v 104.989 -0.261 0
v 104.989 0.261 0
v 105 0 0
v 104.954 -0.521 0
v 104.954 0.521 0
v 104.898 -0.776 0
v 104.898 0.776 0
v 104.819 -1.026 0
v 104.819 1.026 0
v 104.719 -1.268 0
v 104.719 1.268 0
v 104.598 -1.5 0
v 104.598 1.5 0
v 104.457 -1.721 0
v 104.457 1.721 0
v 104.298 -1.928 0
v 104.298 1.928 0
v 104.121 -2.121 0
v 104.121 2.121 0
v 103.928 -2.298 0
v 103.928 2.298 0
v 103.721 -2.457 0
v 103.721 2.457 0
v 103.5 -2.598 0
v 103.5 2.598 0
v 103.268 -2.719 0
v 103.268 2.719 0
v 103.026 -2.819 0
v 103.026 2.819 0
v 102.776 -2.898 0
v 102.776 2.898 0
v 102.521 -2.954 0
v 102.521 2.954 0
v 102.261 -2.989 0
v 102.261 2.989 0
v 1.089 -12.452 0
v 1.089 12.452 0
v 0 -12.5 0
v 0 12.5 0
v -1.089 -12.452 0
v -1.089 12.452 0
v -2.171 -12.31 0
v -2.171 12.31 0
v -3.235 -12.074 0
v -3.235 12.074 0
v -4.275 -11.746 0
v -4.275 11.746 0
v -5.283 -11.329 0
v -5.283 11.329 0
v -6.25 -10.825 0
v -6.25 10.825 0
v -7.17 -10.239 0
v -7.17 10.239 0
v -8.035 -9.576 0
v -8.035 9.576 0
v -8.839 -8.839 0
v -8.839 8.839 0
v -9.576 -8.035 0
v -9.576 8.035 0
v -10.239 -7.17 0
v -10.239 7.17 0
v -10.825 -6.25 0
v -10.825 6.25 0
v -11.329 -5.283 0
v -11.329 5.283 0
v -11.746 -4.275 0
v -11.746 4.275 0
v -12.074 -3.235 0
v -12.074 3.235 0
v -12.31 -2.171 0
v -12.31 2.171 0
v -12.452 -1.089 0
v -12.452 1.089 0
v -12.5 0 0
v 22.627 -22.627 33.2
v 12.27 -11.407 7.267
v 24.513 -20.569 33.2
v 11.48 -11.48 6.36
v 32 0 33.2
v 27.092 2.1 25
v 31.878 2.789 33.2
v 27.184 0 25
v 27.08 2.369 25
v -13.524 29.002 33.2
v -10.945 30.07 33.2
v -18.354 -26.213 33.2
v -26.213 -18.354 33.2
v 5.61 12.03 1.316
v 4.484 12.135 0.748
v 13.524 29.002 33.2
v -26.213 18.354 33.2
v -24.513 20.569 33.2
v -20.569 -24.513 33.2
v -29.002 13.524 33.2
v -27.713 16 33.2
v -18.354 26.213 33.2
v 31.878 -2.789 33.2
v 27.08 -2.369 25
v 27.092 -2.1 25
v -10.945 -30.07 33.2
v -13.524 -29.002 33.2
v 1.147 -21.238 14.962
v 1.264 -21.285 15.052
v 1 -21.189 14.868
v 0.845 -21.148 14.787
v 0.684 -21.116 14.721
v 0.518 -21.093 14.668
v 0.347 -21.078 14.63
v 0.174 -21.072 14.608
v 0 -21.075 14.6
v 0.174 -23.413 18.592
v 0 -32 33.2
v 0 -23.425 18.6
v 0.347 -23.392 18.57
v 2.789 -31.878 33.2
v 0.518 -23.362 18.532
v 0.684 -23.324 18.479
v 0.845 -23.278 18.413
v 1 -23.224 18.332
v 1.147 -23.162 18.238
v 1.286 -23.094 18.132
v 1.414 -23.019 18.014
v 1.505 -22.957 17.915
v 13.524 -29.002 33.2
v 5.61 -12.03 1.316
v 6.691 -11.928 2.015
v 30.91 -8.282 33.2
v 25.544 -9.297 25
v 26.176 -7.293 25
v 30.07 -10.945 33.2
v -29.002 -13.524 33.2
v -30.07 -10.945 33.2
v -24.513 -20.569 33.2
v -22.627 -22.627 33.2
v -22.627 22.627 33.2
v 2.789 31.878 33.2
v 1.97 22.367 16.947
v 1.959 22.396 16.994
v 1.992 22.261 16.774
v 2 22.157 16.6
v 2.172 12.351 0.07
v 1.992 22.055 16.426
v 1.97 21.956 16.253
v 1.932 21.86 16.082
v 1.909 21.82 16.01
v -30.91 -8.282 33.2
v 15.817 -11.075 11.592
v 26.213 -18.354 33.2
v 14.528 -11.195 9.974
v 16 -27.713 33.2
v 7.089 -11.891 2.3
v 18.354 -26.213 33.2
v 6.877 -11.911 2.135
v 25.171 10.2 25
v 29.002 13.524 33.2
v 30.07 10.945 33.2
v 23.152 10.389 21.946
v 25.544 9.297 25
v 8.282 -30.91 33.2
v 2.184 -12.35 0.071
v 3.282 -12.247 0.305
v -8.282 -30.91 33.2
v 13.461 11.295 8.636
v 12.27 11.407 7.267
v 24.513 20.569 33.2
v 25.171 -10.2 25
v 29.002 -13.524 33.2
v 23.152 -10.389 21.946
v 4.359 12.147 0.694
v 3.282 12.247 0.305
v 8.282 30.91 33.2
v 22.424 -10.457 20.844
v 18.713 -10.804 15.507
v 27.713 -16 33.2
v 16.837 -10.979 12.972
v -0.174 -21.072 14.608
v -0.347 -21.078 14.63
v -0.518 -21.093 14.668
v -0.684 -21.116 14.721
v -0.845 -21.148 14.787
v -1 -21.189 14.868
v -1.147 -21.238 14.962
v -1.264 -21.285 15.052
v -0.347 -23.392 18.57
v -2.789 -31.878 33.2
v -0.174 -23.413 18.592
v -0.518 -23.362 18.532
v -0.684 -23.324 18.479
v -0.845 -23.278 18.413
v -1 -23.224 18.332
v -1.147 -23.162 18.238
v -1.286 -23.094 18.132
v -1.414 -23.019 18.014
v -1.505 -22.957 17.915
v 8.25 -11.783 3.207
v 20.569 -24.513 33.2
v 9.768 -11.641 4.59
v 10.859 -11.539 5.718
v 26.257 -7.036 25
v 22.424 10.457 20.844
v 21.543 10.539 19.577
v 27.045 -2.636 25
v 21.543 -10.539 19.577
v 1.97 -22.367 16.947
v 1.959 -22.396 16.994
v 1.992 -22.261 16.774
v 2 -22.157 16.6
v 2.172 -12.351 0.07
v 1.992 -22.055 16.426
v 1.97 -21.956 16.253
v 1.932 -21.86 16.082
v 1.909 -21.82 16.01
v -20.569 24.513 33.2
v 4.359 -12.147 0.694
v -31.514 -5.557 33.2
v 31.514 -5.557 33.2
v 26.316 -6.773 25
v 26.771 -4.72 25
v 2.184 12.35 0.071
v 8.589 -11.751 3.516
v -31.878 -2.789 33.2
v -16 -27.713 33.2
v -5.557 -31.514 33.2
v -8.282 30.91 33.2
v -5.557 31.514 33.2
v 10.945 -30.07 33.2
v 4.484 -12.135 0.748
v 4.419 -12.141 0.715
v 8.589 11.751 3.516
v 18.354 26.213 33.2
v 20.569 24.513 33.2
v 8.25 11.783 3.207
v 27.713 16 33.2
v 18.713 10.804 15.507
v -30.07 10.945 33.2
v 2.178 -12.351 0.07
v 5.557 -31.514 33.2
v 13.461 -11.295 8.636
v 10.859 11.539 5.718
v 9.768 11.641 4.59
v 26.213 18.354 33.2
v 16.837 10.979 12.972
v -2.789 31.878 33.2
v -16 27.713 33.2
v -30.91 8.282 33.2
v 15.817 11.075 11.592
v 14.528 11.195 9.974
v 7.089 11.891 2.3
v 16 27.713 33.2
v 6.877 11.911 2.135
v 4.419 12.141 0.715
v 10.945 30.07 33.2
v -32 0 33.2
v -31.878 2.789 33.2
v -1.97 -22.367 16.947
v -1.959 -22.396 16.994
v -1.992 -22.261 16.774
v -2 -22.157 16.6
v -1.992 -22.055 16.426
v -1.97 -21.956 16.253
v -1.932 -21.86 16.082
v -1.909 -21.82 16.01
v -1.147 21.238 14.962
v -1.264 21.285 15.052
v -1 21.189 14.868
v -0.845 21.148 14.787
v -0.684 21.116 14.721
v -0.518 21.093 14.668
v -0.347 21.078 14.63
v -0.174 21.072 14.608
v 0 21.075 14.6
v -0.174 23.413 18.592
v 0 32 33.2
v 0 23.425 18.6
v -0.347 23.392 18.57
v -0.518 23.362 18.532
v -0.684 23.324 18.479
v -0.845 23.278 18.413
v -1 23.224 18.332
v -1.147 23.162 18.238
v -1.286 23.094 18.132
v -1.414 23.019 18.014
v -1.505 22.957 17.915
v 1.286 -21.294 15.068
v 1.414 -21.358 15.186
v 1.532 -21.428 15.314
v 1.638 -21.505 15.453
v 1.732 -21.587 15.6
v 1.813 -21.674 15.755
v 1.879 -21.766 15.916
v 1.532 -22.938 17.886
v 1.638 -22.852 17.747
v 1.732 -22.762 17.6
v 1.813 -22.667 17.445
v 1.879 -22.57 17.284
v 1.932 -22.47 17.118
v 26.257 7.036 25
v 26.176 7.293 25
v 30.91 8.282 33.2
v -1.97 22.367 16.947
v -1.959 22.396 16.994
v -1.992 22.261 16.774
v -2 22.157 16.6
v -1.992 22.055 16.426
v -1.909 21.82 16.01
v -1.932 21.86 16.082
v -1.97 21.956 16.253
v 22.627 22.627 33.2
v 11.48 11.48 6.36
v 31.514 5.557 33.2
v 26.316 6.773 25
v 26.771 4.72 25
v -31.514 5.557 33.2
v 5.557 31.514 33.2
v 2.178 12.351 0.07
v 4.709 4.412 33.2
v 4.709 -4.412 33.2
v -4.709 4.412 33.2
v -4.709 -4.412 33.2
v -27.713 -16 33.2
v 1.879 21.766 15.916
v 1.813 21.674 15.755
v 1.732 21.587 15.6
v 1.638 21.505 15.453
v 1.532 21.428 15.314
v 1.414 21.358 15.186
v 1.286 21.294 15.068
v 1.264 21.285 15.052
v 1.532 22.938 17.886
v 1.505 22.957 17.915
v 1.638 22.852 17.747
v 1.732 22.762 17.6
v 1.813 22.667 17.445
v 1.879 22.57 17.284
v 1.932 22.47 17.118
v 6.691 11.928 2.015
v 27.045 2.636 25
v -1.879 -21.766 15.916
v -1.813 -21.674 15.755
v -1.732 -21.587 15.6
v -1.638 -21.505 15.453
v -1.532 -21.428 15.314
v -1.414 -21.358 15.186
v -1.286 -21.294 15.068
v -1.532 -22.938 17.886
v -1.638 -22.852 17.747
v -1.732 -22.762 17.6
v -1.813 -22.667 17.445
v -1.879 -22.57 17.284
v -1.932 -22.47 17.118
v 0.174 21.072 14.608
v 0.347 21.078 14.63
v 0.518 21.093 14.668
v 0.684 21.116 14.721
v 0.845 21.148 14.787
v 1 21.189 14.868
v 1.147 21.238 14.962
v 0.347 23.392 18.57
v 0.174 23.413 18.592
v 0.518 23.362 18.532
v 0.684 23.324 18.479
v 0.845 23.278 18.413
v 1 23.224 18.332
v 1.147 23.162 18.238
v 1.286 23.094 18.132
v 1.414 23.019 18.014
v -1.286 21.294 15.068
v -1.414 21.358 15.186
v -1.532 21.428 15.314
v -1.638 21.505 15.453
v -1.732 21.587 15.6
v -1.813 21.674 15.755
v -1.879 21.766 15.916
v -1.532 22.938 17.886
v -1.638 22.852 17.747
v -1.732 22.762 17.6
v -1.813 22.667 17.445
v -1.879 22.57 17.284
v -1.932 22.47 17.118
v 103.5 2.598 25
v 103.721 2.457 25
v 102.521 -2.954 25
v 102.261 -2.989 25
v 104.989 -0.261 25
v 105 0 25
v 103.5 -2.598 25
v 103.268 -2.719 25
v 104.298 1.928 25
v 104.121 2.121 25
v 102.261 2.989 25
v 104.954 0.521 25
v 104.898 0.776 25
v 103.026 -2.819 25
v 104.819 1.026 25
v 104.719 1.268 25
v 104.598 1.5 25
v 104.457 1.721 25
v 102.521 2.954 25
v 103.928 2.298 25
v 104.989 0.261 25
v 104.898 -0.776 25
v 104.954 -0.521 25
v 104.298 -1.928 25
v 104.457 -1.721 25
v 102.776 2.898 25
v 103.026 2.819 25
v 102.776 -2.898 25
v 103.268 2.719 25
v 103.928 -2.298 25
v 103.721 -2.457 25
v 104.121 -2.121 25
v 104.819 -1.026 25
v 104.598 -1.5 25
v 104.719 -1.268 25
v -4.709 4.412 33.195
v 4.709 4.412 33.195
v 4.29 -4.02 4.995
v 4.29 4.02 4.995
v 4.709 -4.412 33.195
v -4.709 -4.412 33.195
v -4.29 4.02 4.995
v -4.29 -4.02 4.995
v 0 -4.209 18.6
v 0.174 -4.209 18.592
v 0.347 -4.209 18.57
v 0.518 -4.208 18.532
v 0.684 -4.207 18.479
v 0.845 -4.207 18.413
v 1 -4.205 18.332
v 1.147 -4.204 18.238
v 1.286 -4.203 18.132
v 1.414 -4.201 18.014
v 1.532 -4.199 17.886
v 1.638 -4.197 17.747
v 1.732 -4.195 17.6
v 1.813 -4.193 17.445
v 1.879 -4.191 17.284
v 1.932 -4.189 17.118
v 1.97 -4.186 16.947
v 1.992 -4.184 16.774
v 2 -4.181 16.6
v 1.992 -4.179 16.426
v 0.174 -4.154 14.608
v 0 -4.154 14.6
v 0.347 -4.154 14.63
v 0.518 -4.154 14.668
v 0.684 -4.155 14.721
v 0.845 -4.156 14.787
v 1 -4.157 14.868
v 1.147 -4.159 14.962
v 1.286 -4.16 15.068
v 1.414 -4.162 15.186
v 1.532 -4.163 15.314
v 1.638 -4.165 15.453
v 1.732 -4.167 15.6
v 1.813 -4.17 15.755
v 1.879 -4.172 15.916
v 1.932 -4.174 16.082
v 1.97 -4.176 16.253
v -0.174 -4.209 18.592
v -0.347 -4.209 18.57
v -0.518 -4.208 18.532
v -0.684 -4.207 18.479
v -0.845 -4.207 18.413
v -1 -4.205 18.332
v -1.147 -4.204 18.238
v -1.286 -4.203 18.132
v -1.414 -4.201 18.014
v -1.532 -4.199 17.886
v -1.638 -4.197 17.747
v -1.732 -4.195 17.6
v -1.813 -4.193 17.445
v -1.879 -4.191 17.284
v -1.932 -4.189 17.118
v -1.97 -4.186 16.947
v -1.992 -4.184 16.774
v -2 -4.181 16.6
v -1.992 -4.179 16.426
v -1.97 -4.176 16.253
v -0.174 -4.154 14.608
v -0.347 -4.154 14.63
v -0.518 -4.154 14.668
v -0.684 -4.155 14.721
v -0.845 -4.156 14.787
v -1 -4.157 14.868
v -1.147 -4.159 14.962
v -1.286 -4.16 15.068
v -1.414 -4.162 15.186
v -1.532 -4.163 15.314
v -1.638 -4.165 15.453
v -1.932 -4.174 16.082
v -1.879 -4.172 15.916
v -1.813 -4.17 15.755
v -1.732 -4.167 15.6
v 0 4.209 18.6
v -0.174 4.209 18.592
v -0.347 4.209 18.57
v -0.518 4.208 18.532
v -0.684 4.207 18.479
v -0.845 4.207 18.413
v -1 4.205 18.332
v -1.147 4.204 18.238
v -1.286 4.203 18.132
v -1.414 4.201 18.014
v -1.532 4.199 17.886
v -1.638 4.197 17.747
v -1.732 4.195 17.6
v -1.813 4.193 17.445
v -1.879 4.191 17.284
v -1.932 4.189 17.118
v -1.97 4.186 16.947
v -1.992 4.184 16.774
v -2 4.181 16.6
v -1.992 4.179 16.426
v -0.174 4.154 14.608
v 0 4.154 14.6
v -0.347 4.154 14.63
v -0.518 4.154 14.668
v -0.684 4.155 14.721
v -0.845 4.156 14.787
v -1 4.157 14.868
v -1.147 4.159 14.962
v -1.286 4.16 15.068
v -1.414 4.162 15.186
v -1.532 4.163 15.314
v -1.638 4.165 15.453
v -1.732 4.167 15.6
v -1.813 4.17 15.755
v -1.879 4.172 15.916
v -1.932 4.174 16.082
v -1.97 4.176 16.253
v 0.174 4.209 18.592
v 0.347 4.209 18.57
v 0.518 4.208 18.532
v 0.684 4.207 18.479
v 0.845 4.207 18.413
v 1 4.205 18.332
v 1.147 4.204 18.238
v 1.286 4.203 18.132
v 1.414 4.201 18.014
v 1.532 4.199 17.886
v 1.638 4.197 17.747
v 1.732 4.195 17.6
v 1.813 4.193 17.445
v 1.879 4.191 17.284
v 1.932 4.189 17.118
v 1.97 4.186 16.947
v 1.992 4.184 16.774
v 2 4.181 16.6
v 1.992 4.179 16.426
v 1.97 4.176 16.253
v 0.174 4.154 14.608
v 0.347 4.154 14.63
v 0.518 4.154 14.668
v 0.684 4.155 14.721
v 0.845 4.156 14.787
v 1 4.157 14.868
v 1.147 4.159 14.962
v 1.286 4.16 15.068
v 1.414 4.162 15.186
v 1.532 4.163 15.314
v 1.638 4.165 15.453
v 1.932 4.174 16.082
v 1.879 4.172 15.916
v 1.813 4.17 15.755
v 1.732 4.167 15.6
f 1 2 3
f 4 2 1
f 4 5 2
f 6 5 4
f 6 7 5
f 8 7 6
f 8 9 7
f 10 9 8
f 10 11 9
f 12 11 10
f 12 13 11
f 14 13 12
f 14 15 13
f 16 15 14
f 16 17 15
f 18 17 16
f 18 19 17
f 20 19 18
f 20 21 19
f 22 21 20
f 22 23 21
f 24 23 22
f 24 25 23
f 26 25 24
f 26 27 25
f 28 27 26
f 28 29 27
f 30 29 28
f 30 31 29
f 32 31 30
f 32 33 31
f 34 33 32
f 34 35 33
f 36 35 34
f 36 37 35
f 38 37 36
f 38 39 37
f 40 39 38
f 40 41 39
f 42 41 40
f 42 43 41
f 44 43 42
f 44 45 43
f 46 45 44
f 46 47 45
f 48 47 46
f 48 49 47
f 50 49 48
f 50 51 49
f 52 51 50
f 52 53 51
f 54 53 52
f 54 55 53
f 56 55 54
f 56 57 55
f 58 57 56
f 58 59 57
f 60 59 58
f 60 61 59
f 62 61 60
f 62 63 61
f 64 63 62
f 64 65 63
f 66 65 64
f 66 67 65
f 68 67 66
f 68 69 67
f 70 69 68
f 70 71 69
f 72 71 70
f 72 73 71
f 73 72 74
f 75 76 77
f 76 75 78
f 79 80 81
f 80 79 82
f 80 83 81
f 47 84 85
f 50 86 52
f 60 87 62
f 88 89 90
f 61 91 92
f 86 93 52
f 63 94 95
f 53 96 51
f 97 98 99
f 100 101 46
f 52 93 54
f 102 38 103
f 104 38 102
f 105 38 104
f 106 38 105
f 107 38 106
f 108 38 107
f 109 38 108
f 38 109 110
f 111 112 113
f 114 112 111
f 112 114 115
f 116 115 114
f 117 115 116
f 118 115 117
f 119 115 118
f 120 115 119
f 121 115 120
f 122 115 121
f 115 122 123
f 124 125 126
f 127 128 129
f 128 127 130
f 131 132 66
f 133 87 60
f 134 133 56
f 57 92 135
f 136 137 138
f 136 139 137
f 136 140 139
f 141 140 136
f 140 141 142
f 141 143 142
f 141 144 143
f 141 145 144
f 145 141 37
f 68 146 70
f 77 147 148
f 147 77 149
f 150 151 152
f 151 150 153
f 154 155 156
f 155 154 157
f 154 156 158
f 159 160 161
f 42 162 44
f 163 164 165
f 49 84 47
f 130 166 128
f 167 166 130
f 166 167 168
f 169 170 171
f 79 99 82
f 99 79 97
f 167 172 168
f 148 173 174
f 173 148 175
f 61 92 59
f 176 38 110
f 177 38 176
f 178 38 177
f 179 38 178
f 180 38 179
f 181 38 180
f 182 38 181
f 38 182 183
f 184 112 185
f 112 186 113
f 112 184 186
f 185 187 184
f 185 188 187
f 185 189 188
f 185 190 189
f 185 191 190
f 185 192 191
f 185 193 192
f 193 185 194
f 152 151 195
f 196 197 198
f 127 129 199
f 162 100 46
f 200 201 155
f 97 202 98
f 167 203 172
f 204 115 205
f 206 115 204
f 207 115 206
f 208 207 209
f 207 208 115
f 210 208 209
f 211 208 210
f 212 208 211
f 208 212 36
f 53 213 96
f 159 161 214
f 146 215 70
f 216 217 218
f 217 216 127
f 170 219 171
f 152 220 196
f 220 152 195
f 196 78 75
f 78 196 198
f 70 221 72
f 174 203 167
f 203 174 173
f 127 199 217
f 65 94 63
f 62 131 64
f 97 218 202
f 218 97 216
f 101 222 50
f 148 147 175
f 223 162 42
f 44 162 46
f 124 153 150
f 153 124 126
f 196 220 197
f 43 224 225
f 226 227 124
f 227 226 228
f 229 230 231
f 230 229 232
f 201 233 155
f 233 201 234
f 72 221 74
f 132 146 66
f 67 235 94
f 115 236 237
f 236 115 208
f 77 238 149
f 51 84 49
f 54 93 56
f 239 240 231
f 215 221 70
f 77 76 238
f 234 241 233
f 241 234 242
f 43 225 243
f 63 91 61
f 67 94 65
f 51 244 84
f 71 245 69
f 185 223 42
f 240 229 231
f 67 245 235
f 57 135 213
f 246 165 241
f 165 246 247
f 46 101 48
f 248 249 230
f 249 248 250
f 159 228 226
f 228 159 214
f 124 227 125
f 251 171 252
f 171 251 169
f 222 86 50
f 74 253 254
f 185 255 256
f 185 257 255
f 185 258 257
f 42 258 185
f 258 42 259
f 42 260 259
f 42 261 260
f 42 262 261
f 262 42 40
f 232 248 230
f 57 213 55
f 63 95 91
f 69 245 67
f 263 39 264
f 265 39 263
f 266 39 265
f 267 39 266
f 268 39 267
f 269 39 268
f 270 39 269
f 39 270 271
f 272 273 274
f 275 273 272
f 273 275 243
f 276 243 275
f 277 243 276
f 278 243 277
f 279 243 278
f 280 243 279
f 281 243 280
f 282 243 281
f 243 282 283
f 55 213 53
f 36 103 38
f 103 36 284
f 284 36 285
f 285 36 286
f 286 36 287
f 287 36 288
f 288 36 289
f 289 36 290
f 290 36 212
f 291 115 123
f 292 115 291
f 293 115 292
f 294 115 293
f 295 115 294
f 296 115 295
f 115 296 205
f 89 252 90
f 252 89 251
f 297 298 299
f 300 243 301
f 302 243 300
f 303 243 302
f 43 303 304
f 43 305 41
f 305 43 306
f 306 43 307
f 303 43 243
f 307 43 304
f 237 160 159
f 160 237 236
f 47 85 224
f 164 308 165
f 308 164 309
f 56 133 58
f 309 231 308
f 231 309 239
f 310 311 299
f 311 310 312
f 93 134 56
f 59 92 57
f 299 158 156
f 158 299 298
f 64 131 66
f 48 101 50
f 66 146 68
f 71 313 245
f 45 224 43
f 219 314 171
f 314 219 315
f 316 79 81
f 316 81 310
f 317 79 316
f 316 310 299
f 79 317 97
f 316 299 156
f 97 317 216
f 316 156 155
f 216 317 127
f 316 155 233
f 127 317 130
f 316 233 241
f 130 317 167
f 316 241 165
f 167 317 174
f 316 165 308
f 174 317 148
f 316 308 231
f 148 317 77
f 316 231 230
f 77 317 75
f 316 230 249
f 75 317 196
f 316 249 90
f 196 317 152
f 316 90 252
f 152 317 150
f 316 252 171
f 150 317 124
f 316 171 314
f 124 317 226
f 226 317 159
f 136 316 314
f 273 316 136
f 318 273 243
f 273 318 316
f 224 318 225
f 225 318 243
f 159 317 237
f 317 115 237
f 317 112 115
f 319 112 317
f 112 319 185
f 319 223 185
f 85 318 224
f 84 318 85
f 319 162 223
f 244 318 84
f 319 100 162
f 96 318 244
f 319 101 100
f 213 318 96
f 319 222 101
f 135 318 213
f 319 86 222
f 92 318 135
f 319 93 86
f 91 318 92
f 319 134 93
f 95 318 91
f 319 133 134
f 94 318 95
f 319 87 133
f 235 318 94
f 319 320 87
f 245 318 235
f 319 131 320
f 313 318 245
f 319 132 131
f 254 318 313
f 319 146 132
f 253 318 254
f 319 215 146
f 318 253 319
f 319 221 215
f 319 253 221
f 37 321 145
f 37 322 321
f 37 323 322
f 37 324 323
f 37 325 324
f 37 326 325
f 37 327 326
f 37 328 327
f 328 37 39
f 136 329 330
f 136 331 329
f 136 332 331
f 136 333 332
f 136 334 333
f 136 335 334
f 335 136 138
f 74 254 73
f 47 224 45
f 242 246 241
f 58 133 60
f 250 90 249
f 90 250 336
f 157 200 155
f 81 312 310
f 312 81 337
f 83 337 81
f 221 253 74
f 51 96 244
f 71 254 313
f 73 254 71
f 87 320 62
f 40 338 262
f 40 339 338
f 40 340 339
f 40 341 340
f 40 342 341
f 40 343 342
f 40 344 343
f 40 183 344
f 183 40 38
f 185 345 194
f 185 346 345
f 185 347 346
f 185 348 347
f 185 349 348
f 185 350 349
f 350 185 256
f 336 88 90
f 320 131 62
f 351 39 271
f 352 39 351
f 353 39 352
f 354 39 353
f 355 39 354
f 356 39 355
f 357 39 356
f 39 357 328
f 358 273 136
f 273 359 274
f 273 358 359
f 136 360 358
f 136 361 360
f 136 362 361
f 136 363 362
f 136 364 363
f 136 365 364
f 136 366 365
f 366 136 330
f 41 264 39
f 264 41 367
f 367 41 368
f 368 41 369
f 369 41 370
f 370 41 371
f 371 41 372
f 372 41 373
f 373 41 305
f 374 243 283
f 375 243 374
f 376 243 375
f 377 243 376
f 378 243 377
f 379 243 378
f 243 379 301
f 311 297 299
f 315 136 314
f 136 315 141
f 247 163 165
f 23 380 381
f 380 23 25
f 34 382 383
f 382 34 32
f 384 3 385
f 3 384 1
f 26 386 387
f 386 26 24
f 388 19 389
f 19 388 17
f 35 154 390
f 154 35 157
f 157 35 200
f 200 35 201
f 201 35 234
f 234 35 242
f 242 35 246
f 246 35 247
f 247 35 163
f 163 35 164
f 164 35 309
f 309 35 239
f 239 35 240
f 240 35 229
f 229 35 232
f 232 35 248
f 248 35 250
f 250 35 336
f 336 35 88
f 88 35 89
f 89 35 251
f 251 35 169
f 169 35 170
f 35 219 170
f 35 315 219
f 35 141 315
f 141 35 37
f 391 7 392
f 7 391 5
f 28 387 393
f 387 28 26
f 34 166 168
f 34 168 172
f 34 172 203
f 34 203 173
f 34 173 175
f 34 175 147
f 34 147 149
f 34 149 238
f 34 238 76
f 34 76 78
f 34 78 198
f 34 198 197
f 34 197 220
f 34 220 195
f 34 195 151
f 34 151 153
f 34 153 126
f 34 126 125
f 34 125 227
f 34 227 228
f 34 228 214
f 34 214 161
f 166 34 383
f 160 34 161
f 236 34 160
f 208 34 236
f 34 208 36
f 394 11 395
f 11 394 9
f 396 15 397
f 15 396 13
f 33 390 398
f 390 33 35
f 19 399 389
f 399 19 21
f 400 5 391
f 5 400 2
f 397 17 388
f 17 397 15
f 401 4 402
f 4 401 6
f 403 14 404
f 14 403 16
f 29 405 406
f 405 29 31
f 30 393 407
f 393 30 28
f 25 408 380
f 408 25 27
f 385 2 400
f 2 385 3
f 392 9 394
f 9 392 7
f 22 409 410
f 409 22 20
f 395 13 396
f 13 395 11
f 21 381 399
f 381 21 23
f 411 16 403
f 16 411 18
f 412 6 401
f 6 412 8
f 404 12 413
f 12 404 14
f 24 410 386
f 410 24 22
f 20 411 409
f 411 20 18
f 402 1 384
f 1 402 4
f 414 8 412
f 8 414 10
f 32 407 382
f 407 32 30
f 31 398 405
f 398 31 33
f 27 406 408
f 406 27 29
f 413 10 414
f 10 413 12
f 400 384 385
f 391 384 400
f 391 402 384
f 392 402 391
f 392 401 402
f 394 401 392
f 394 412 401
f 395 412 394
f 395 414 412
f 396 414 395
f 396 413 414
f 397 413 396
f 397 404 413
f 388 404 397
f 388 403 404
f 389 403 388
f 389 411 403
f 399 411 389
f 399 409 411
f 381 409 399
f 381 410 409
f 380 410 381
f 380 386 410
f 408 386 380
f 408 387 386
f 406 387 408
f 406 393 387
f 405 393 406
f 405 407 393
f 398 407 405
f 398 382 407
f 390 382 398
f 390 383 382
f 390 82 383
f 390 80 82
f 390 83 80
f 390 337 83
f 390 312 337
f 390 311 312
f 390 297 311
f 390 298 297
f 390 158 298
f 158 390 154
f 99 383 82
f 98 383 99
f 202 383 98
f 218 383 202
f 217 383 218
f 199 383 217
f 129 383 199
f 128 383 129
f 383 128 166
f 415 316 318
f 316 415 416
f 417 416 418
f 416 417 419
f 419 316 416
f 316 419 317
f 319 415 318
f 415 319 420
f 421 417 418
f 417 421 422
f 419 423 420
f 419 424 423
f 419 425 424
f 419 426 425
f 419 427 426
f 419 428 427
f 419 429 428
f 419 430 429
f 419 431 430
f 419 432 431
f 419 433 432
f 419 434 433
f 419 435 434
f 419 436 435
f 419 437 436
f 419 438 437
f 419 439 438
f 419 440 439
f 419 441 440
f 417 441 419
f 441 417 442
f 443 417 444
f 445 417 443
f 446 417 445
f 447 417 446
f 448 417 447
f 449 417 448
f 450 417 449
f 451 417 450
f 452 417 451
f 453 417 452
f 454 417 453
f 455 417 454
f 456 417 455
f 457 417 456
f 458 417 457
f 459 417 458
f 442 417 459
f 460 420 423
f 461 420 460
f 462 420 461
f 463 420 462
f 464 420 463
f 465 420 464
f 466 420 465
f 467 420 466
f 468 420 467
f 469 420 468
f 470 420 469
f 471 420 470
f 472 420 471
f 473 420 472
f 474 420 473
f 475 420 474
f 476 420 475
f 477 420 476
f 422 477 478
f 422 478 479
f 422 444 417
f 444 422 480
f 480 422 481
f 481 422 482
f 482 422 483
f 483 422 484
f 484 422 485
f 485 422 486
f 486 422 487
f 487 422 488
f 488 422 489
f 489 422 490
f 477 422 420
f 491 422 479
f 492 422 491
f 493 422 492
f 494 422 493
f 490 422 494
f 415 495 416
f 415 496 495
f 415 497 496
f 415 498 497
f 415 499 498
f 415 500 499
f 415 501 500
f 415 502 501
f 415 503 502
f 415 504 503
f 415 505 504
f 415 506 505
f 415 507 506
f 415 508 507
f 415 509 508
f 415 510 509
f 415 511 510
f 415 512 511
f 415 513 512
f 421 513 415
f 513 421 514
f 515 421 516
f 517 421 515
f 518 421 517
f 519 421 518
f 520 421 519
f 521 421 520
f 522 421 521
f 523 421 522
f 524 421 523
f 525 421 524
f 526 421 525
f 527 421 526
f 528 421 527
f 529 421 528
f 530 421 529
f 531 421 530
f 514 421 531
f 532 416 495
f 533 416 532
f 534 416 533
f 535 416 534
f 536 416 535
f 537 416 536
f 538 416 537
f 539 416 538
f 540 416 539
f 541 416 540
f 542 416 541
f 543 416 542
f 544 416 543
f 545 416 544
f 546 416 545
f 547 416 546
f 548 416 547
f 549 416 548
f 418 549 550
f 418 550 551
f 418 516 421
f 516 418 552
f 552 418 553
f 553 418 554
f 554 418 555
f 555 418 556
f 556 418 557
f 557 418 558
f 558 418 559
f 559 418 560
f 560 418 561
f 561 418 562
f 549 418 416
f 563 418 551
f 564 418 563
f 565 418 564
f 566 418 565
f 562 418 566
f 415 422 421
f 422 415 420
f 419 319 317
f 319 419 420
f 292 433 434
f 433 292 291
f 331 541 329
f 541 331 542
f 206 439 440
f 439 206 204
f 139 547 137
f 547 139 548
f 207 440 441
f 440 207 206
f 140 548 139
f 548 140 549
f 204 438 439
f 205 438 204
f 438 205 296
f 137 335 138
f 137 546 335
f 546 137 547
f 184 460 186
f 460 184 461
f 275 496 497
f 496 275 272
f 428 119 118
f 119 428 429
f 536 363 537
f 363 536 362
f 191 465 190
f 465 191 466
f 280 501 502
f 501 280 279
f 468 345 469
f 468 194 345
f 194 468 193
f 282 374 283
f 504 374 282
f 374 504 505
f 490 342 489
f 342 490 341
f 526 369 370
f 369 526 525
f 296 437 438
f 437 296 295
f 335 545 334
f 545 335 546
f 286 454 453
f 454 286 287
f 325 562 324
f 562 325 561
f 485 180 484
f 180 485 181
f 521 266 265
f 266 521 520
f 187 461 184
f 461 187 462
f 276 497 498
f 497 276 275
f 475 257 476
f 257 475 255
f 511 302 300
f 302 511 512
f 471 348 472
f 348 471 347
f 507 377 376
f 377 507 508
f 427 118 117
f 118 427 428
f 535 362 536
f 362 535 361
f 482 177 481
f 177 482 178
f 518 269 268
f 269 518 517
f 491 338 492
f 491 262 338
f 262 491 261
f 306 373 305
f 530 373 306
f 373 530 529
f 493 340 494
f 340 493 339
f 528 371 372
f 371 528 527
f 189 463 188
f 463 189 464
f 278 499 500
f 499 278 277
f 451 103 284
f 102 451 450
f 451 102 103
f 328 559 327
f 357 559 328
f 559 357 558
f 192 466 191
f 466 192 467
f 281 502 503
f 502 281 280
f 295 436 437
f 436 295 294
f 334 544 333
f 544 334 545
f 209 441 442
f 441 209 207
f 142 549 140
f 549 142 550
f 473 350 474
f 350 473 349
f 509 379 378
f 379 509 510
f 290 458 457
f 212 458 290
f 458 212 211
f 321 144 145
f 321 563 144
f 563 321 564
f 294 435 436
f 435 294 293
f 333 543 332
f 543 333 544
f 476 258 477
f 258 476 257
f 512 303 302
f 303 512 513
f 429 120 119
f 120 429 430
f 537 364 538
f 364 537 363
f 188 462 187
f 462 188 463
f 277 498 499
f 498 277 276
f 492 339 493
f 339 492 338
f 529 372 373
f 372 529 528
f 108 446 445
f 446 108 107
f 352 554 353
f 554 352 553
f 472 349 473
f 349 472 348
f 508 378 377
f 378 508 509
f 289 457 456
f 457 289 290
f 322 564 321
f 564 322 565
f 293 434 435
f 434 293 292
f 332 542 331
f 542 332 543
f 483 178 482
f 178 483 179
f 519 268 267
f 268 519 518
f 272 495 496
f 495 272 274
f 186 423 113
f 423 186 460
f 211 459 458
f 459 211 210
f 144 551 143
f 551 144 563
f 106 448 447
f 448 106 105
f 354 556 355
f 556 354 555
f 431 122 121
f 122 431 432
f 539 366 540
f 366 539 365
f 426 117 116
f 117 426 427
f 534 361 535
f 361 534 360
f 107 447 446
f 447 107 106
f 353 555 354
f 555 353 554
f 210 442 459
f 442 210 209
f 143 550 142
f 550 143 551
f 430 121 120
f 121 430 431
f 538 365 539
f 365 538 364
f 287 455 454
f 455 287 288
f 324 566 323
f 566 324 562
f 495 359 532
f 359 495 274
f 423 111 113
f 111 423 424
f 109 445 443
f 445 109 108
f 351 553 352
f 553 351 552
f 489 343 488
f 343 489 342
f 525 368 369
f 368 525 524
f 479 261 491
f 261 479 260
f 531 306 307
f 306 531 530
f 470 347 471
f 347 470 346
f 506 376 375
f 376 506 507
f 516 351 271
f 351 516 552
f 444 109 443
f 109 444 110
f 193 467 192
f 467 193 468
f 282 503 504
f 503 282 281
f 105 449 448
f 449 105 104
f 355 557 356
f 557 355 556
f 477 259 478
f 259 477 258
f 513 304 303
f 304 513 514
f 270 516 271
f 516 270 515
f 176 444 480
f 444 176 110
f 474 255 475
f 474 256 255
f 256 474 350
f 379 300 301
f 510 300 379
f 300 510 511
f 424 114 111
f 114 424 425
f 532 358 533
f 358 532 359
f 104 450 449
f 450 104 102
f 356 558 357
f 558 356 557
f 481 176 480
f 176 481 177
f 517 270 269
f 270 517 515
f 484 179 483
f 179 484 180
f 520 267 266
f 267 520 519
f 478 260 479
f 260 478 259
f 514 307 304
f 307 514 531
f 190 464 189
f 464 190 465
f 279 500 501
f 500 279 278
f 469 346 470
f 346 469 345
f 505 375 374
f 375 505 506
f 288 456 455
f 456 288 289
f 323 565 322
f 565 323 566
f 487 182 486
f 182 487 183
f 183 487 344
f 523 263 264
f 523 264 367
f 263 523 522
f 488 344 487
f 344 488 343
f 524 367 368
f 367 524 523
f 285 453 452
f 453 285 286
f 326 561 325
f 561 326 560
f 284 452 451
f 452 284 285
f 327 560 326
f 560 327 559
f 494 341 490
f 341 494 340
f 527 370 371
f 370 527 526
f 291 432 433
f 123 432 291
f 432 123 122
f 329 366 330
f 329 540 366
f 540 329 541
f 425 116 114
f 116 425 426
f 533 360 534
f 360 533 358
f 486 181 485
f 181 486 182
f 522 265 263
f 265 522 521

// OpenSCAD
spindleWidth = 8.38;
spindleHeight = 7.84;
spindleDepth = 28;
depthTolerance = 2;
spindleTolerance = 0.2;
spindleExpansion = 1.1;
extraDepth = 5;
mainDiameter = 64;
shaftDiameter = 25;
handleWidth = 25;
handleLength = 102;
minThickness = 6;
screwHoleDiameter = 4;

height = spindleDepth+spindleTolerance+extraDepth;

$fn = 72;

difference() {
union() {
cylinder(d1=shaftDiameter,d2=mainDiameter,h=height);
linear_extrude(height=handleWidth) {
    hull() {
        circle(d=shaftDiameter);
        translate([handleLength,0]) circle(d=minThickness);
    }
}
}
translate([0,0,extraDepth]) hull() {
translate([0,0,height-extraDepth])
cube([spindleWidth*spindleExpansion+spindleTolerance,spindleHeight*spindleExpansion+spindleTolerance,.01],center=true);
cube([spindleWidth+spindleTolerance,spindleHeight+spindleTolerance,.01],center=true);
}
translate([0,0,height/2])
rotate([90,0,0])
cylinder(d=screwHoleDiameter,h=2*mainDiameter,center=true);
}
